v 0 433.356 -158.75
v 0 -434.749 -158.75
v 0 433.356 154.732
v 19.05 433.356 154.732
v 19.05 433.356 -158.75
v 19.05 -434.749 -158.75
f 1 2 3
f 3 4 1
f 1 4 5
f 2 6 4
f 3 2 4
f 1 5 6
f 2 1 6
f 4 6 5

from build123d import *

# Parameters (mm, degrees)
F1_DEPTH = 19.05
F3_DEPTH = 25.4
F4_DEPTH = 3.175


with BuildPart() as f1:
    # F0 (on Right) → F1 (new body)
    with BuildSketch(Plane.YZ):
        with BuildLine():
            ThreePointArc((482.6, 127), (467.7210244843, 162.9210244843), (431.8, 177.8))
            Line((431.8, 177.8), (-482.6, -152.4))
            ThreePointArc((-482.6, -152.4), (-475.1605122421, -170.3605122421), (-457.2, -177.8))
            Line((-457.2, -177.8), (431.8, -177.8))
            ThreePointArc((431.8, -177.8), (467.7210244843, -162.9210244843), (482.6, -127))
            Line((482.6, -127), (482.6, 127))
        make_face()
    extrude(amount=F1_DEPTH)

    # F2 (on face) → F3 (cut)
    with BuildSketch(Plane.YZ.offset(19.05)):
        with BuildLine():
            Line((461.4467891453, 168.2517623063), (433.3557372898, 158.1077713585))
            Line((433.3557372898, 158.1077713585), (433.3557372898, -158.75))
            Line((433.3557372898, -158.75), (471.4557372898, -158.75))
            ThreePointArc((471.4557372898, -158.75), (479.733033778, -143.8245140446), (482.6, -127))
            Line((482.6, -127), (482.6, 127))
            ThreePointArc((482.6, 127), (477.0034118656, 150.1795503776), (461.4467891453, 168.2517623063))
        make_face()
        with BuildLine():
            Line((431.8, 177.8), (-25.4, 12.7))
            Line((-25.4, 12.7), (-18.929772965, -5.2175517891))
            Line((-18.929772965, -5.2175517891), (433.3557372898, 158.1077713585))
            Line((433.3557372898, 158.1077713585), (461.4467891453, 168.2517623063))
            ThreePointArc((461.4467891453, 168.2517623063), (447.3732218061, 175.3540563198), (431.8, 177.8))
        make_face()
        with BuildLine():
            Line((-18.929772965, -5.2175517891), (-25.4, 12.7))
            Line((-25.4, 12.7), (-482.6, -152.4))
            ThreePointArc((-482.6, -152.4), (-480.7436230259, -161.931936572), (-475.4458413533, -170.0705764849))
            Line((-475.4458413533, -170.0705764849), (-444.0965526259, -158.75))
            Line((-444.0965526259, -158.75), (-18.929772965, -5.2175517891))
        make_face()
        with BuildLine():
            Line((-12.7, -158.75), (-444.0965526259, -158.75))
            Line((-444.0965526259, -158.75), (-475.4458413533, -170.0705764849))
            ThreePointArc((-475.4458413533, -170.0705764849), (-467.1077585074, -175.7879524832), (-457.2, -177.8))
            Line((-457.2, -177.8), (-12.7, -177.8))
            Line((-12.7, -177.8), (-12.7, -158.75))
        make_face()
        with BuildLine():
            Line((471.4557372898, -158.75), (433.3557372898, -158.75))
            Line((433.3557372898, -158.75), (-12.7, -158.75))
            Line((-12.7, -158.75), (-12.7, -177.8))
            Line((-12.7, -177.8), (431.8, -177.8))
            ThreePointArc((431.8, -177.8), (453.7970452561, -172.7905011984), (471.4557372898, -158.75))
        make_face()
    extrude(amount=-F3_DEPTH, mode=Mode.SUBTRACT)

    # F4 (cut): a face of the model
    f4_faces = [f1.faces().sort_by_distance(p)[0] for p in [
        (9.525, -5.370407668, -0.3211143208),
    ]]
    extrude(f4_faces, amount=-F4_DEPTH, mode=Mode.SUBTRACT)


solid = f1.part
